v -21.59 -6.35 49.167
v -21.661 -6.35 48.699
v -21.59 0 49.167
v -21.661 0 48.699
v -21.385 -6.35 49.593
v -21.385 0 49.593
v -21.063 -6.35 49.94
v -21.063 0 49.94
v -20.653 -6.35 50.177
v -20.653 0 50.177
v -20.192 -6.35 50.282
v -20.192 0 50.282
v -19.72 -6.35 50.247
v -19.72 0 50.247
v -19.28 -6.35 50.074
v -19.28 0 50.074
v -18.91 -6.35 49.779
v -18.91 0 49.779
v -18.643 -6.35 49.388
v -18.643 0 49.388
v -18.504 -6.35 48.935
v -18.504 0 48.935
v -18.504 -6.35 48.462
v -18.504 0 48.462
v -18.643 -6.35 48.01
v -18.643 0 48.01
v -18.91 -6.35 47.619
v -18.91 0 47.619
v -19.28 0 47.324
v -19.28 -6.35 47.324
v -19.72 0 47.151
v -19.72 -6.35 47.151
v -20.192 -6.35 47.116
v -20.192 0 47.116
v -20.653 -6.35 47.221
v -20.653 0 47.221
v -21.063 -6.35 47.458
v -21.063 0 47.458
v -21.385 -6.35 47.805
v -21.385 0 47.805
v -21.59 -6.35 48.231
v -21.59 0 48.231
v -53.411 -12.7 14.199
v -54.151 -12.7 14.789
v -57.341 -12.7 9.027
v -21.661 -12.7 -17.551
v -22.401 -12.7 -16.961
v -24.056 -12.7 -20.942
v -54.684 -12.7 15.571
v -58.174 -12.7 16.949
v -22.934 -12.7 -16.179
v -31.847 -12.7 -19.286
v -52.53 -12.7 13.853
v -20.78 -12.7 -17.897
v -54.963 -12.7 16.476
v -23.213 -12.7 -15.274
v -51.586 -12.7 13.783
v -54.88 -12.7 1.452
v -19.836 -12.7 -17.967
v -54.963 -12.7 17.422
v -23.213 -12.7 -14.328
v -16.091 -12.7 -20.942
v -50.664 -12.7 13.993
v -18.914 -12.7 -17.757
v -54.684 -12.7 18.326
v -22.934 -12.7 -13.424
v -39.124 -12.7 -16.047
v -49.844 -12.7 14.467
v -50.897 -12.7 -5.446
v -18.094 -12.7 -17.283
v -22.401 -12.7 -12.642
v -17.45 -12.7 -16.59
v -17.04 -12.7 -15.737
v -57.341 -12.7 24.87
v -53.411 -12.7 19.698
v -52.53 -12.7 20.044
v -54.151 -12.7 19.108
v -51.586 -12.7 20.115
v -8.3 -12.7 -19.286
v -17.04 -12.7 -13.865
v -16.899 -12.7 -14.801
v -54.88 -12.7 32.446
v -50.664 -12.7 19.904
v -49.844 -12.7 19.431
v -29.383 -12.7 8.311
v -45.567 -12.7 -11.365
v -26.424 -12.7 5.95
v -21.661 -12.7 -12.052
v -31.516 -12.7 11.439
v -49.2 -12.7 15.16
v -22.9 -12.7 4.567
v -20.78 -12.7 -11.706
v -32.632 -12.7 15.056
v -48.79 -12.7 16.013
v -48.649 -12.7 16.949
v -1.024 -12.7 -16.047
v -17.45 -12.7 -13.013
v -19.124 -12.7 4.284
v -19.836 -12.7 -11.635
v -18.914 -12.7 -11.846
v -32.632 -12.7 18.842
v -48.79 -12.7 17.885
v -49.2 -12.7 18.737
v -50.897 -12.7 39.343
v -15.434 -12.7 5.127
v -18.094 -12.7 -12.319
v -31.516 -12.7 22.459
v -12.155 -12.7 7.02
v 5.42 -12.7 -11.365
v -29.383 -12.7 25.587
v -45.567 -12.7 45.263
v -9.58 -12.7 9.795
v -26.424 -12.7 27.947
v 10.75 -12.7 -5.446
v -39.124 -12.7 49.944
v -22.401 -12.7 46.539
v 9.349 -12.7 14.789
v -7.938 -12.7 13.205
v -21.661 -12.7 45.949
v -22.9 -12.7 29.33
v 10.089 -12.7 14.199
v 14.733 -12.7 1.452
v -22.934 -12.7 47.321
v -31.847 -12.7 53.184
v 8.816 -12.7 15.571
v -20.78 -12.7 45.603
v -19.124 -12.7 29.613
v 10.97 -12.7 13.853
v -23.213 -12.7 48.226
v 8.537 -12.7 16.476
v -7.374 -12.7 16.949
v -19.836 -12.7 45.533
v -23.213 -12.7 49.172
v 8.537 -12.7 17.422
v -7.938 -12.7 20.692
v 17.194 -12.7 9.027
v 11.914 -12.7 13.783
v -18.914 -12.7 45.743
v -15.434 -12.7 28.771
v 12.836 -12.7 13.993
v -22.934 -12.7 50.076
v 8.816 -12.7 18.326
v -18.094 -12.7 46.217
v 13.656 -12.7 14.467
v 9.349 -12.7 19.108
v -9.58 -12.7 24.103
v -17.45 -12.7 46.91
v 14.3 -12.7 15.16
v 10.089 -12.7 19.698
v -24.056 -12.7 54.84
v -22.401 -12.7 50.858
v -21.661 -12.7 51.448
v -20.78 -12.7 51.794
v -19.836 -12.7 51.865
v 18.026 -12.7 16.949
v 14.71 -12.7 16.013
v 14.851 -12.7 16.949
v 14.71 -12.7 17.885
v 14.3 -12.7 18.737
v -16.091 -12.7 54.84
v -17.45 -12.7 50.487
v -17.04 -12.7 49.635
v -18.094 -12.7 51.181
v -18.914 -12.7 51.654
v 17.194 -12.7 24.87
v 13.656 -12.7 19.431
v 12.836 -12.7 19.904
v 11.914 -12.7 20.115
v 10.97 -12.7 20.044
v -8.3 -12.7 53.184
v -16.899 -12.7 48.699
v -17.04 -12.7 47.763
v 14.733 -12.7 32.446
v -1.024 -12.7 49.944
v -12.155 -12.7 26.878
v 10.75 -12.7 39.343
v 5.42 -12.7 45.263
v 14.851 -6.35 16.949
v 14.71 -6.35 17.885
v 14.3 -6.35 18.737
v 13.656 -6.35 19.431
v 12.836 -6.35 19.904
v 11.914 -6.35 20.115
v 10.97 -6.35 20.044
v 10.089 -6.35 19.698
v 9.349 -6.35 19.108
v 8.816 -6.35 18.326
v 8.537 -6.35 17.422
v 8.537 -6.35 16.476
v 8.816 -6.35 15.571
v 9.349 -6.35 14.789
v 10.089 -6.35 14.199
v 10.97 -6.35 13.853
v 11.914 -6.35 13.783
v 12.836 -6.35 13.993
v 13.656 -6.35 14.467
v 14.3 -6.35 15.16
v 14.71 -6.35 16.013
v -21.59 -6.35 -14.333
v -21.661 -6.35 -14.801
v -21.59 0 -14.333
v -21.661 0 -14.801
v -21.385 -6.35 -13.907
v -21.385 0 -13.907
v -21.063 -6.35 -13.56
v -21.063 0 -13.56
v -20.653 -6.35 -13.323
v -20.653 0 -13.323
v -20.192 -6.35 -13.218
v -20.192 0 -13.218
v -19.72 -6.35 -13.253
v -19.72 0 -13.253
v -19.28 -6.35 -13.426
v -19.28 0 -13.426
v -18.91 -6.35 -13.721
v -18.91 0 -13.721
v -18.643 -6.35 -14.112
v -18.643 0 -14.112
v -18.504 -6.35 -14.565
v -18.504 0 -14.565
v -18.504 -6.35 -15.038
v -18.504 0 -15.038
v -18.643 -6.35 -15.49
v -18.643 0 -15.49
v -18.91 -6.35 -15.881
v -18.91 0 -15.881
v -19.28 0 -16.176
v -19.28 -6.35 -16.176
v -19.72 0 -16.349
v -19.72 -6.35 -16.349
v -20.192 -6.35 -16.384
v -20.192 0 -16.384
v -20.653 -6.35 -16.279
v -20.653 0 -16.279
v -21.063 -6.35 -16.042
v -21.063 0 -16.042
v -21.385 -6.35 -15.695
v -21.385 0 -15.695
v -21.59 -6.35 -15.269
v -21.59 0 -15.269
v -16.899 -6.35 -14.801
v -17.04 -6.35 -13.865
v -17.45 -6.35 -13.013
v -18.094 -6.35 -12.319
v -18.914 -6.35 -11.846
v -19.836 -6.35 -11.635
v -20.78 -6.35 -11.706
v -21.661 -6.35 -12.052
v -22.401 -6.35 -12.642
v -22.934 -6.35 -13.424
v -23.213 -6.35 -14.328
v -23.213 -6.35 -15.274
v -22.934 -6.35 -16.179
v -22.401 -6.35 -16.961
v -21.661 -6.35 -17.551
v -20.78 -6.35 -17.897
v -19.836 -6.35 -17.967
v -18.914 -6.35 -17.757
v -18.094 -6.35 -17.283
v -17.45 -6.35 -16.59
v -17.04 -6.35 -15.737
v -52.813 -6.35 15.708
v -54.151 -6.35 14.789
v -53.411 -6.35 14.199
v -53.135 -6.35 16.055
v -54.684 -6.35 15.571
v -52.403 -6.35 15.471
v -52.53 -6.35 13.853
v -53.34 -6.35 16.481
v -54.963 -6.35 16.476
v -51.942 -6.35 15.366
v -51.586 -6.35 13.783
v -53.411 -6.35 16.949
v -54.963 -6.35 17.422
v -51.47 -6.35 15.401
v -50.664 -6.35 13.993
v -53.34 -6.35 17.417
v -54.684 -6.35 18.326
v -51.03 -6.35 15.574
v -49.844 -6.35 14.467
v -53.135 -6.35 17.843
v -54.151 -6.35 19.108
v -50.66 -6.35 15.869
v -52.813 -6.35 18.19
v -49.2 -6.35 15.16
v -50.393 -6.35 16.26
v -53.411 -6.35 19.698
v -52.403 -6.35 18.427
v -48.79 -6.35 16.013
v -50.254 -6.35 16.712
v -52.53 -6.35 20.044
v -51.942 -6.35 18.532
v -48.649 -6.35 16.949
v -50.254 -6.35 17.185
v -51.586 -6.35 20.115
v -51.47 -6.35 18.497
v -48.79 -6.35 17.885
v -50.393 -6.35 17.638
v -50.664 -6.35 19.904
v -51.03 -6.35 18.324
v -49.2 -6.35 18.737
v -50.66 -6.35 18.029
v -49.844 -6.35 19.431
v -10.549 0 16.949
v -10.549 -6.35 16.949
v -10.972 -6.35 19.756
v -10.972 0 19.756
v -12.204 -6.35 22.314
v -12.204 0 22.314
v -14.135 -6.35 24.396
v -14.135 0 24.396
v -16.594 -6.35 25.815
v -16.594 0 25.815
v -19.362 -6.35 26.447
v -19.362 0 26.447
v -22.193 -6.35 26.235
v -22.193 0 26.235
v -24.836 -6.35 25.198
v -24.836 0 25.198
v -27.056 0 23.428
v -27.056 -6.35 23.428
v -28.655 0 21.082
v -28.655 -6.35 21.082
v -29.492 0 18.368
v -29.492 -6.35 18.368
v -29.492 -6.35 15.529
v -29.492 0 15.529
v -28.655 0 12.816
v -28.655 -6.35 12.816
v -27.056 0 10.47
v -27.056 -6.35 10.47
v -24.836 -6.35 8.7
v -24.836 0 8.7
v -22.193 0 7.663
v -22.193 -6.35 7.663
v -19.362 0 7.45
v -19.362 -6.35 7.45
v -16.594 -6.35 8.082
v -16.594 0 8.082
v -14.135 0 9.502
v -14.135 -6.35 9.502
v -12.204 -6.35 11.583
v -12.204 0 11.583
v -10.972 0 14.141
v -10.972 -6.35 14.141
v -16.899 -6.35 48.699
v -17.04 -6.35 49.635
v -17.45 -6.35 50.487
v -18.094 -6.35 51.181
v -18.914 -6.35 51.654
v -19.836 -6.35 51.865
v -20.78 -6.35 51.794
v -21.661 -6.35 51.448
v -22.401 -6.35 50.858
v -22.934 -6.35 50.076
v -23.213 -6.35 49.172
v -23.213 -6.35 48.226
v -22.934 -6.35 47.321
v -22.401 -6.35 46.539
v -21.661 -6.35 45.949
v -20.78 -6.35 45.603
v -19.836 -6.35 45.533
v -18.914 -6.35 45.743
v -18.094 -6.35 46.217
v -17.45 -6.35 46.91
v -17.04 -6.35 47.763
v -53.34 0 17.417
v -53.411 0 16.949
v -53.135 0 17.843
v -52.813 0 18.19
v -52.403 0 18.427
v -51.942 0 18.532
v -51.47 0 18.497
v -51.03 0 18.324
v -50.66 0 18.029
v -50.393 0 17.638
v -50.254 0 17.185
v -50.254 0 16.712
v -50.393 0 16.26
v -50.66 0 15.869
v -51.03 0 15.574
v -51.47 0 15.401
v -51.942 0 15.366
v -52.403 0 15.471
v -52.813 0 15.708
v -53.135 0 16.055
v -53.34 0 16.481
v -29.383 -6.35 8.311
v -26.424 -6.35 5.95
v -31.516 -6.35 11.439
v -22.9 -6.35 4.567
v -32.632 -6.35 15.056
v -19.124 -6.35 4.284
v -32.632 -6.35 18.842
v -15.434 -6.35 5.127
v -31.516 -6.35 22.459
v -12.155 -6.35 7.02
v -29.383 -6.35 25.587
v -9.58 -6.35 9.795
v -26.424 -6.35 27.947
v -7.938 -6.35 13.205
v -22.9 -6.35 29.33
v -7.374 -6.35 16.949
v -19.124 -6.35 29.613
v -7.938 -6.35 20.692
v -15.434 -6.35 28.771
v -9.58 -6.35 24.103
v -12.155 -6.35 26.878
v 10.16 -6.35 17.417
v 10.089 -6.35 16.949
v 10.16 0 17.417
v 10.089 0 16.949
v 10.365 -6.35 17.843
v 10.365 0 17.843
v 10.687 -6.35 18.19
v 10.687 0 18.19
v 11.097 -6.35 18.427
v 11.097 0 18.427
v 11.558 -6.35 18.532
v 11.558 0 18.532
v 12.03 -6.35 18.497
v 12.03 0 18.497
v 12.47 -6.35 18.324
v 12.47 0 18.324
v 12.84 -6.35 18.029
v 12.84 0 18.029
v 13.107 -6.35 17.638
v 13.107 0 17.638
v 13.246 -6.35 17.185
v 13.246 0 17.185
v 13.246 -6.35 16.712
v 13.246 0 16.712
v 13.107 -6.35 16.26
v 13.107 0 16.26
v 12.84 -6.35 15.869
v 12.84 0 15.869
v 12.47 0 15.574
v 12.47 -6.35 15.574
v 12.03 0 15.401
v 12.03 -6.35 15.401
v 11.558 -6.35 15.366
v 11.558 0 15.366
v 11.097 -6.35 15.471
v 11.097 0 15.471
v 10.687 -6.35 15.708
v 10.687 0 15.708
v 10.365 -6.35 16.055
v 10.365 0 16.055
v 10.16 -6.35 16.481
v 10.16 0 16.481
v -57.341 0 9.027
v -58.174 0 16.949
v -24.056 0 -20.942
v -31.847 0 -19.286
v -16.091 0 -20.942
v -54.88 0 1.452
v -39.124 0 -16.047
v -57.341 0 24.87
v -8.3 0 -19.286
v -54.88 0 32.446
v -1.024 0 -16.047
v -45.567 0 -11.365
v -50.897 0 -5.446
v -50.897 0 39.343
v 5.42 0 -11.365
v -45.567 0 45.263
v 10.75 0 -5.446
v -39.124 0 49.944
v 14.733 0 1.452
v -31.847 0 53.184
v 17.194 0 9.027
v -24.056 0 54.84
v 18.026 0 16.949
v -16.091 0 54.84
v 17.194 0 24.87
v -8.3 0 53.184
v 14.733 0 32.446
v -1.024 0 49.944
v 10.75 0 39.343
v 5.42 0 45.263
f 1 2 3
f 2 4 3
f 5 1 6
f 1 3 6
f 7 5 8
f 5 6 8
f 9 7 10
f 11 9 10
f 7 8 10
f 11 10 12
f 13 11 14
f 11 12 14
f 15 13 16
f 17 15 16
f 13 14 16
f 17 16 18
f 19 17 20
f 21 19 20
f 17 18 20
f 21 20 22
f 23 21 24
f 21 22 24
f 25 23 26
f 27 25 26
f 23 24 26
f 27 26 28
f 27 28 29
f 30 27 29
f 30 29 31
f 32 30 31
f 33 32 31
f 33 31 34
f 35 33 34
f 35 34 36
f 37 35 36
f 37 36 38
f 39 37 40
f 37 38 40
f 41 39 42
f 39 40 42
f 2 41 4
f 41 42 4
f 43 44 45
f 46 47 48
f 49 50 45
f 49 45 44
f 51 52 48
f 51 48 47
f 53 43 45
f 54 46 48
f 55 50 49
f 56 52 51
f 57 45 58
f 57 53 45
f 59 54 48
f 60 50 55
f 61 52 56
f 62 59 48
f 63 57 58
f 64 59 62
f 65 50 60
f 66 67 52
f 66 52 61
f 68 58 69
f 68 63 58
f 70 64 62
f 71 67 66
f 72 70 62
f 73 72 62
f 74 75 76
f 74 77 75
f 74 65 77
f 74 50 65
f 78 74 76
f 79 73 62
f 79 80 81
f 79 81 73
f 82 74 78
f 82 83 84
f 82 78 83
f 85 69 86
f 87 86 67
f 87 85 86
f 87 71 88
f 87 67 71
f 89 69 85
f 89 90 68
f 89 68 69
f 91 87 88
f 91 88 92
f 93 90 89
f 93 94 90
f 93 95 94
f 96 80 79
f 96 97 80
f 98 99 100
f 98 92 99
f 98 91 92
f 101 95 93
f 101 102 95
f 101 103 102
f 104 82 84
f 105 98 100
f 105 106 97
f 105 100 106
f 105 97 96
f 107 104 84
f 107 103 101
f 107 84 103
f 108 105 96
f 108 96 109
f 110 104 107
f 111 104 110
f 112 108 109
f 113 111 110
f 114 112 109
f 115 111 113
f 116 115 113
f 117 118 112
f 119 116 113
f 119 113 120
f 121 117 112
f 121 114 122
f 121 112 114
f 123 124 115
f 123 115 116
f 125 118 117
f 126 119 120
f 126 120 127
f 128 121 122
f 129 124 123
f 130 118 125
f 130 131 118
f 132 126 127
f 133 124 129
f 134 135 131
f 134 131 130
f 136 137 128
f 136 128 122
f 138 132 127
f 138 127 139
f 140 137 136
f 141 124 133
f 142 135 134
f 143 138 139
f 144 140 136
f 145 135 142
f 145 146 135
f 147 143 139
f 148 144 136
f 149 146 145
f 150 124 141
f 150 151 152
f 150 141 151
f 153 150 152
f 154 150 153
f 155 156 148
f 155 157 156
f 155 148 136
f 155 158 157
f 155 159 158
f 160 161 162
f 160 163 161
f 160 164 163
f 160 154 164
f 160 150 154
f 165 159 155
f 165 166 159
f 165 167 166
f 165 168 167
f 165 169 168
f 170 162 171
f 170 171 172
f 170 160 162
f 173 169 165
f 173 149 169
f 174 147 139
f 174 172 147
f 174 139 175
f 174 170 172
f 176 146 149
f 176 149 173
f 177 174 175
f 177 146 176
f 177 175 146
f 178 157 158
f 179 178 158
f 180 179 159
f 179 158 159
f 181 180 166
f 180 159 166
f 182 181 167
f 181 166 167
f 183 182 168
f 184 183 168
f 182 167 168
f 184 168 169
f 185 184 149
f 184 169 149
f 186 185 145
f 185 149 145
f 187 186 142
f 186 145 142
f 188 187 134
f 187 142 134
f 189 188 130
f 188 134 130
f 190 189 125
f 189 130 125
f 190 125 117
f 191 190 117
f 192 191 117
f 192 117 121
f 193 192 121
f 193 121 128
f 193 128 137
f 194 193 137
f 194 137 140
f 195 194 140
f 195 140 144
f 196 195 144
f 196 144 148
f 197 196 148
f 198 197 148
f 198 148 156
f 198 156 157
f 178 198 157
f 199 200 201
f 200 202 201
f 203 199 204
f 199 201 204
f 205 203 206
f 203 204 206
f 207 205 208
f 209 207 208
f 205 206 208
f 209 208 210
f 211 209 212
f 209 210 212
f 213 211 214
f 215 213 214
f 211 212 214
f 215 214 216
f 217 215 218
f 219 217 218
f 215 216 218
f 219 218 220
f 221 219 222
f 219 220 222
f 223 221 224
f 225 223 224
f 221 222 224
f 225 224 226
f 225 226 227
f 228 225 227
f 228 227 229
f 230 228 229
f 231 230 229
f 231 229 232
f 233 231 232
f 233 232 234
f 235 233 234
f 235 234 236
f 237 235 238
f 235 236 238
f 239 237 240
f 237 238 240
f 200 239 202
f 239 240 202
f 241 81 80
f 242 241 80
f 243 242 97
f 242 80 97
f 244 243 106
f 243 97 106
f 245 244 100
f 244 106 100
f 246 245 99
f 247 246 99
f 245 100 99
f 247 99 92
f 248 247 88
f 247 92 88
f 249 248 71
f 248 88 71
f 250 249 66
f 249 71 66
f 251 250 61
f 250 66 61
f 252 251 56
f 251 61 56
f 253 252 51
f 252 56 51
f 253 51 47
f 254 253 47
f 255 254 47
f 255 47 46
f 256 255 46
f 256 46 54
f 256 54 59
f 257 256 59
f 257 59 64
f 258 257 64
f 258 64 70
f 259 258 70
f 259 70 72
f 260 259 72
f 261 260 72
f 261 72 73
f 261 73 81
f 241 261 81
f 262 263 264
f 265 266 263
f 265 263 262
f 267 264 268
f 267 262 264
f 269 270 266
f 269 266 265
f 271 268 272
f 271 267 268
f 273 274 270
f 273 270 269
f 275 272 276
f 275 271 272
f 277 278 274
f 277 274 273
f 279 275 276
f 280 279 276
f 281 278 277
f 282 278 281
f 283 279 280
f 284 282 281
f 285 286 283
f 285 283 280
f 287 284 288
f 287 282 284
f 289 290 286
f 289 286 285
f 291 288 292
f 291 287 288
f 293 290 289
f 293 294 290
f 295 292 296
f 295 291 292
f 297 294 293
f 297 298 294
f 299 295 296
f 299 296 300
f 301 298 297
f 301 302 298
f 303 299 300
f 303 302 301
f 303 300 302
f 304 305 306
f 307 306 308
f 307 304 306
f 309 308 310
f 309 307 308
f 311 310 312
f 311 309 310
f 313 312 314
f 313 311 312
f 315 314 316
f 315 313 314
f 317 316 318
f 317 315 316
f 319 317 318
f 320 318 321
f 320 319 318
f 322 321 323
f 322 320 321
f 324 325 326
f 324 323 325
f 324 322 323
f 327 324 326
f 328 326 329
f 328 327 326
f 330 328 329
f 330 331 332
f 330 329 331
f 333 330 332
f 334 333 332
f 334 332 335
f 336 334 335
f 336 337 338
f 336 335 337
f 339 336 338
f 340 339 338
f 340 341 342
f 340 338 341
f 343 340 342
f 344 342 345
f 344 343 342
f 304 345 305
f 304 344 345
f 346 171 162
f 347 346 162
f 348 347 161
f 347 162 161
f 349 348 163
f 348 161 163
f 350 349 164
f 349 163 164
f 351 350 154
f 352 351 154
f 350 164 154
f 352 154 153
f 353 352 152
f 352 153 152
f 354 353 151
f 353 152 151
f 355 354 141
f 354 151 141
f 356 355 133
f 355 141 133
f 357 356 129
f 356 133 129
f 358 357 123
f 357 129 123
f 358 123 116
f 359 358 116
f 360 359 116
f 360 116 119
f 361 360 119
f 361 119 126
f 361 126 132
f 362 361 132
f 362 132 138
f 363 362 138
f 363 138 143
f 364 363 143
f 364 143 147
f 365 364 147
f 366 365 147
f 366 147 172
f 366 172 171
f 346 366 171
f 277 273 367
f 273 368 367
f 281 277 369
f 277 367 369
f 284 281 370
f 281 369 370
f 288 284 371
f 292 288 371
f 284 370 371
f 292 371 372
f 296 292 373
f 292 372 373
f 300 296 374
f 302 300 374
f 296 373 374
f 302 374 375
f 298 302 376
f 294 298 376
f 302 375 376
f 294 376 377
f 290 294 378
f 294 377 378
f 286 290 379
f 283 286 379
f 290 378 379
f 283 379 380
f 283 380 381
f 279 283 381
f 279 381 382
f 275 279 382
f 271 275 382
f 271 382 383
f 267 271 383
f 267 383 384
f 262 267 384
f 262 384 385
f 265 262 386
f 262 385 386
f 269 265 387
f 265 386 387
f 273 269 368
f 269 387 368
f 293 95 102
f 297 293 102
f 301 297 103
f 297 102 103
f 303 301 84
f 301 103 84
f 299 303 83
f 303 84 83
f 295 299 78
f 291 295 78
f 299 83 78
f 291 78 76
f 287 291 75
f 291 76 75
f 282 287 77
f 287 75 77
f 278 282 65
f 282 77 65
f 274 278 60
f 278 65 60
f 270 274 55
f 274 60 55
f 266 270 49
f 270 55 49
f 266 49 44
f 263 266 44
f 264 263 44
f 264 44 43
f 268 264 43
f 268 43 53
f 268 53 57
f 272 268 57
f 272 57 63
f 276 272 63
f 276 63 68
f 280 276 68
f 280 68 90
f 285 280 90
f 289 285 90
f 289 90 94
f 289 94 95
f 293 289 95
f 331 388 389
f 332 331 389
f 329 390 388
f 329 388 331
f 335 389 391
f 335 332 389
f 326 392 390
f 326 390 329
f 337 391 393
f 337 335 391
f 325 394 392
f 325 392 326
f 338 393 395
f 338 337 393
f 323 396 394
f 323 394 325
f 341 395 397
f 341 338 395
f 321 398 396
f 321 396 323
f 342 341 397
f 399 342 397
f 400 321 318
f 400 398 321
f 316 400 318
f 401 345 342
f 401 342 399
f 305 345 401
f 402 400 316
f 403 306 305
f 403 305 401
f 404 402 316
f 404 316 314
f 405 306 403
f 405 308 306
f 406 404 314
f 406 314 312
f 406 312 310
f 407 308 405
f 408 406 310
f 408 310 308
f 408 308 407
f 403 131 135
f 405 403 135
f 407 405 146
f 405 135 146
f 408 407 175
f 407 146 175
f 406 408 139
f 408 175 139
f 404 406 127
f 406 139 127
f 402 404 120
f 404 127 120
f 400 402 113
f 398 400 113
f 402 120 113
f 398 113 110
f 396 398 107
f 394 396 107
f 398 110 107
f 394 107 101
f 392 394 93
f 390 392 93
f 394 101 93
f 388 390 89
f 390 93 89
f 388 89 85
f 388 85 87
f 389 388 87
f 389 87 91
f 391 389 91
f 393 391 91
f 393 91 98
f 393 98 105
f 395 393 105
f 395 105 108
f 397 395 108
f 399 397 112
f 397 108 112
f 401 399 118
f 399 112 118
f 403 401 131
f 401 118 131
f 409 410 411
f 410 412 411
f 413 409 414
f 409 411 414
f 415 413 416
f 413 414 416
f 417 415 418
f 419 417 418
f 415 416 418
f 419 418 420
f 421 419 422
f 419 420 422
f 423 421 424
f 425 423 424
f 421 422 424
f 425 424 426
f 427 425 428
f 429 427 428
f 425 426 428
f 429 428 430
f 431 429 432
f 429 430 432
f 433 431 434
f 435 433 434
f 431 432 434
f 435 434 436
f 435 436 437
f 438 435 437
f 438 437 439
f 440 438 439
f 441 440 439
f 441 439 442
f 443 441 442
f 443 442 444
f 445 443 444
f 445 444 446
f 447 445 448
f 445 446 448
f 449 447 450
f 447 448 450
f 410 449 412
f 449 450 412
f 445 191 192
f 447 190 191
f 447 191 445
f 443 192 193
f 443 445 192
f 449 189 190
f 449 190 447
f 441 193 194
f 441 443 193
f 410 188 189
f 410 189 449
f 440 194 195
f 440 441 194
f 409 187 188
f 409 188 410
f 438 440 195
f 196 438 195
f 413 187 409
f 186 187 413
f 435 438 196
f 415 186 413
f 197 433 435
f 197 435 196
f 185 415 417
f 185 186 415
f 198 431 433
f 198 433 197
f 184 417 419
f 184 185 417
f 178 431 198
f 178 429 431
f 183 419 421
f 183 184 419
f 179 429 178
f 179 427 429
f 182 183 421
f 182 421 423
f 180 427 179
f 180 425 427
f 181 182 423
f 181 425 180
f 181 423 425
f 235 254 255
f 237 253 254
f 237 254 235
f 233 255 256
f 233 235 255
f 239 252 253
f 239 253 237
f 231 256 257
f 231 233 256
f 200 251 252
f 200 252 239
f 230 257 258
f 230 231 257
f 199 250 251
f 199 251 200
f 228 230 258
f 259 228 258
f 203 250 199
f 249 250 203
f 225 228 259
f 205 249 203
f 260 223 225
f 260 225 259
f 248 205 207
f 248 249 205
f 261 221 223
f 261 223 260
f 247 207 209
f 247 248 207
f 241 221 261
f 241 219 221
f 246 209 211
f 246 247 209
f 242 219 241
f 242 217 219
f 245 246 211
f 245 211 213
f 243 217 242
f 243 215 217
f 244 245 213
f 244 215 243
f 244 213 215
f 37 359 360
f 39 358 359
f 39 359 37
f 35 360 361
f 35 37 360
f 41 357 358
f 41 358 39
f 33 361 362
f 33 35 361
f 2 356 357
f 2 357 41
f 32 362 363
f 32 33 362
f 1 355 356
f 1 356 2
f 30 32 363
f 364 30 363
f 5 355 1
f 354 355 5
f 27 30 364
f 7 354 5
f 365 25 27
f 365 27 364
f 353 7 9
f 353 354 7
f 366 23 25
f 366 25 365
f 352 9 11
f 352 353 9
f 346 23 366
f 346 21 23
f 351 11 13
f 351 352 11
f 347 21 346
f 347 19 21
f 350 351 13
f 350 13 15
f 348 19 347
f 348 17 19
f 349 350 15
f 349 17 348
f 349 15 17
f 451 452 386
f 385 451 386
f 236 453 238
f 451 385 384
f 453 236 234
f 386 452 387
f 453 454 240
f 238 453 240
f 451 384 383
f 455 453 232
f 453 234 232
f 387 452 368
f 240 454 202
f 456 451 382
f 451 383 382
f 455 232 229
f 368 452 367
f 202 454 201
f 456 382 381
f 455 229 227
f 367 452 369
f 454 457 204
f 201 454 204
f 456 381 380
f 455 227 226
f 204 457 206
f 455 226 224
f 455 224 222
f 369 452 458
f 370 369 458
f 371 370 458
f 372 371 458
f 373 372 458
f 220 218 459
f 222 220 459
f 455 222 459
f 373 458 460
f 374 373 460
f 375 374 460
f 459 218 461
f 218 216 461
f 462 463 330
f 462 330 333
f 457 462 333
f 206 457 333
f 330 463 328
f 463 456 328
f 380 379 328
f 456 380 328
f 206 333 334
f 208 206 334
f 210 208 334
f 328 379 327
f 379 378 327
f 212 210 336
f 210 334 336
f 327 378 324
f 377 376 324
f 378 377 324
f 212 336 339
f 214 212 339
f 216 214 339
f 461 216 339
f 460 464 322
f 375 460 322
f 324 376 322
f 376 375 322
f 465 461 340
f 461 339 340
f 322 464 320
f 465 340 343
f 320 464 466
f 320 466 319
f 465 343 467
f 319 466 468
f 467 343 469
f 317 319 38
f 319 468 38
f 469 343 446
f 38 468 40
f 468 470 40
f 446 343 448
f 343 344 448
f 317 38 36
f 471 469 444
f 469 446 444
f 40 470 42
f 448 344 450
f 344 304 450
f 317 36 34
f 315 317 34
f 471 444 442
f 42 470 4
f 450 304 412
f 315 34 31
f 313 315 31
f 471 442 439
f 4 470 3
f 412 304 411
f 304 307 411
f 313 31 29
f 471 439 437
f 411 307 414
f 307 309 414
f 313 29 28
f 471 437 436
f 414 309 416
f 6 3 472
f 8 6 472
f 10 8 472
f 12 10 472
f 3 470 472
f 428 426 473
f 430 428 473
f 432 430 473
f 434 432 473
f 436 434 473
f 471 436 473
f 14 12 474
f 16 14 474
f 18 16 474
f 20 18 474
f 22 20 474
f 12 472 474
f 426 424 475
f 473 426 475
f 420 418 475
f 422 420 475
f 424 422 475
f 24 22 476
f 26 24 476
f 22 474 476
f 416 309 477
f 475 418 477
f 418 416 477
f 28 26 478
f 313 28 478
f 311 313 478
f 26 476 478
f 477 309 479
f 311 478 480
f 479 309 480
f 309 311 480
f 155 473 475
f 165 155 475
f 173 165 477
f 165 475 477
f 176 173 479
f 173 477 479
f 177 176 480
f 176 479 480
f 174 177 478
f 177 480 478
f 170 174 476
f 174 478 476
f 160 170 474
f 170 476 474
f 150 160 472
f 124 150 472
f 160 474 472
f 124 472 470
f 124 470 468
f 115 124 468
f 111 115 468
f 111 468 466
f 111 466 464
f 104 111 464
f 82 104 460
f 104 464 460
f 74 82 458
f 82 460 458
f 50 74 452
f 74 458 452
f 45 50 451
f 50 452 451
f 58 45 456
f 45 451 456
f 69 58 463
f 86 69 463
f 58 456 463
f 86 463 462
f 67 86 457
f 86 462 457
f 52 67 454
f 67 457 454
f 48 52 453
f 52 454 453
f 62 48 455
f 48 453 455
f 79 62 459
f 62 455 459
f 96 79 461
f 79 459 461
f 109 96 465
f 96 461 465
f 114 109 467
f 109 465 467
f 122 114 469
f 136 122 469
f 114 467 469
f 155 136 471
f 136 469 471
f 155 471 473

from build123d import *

# Parameters (mm, degrees)
F0_R           = 38.1
F0_R_2         = 9.525
F1_DEPTH       = 12.7
F2_R           = 12.7
F3_DEPTH       = 6.35
F5_D           = 3.175
F5_CBORE_D     = 6.35
F5_CBORE_DEPTH = 6.35


with BuildPart() as f1:
    # F0 (on Front) → F1 (new body)
    with BuildSketch(Plane.XZ):
        with Locations((-20.073514, 16.948864)):
            Circle(F0_R)
        with Locations((-20.073514, 16.948864)):
            Circle(F0_R_2, mode=Mode.SUBTRACT)
    extrude(amount=F1_DEPTH)

    # F2 (on face) → F3 (cut)
    with BuildSketch(Plane.XZ.offset(12.7)):
        with Locations((-20.073514, 16.948864)):
            Circle(F2_R)
    extrude(amount=-F3_DEPTH, mode=Mode.SUBTRACT)

    # F5 (through all)
    with Locations(Plane.XZ.offset(12.7)):
        with Locations((-20.073514, 48.698864), (-51.823514, 16.948864), (-20.073514, -14.801136), (11.676486, 16.948864)):
            CounterBoreHole(F5_D / 2, F5_CBORE_D / 2, F5_CBORE_DEPTH)


solid = f1.part
